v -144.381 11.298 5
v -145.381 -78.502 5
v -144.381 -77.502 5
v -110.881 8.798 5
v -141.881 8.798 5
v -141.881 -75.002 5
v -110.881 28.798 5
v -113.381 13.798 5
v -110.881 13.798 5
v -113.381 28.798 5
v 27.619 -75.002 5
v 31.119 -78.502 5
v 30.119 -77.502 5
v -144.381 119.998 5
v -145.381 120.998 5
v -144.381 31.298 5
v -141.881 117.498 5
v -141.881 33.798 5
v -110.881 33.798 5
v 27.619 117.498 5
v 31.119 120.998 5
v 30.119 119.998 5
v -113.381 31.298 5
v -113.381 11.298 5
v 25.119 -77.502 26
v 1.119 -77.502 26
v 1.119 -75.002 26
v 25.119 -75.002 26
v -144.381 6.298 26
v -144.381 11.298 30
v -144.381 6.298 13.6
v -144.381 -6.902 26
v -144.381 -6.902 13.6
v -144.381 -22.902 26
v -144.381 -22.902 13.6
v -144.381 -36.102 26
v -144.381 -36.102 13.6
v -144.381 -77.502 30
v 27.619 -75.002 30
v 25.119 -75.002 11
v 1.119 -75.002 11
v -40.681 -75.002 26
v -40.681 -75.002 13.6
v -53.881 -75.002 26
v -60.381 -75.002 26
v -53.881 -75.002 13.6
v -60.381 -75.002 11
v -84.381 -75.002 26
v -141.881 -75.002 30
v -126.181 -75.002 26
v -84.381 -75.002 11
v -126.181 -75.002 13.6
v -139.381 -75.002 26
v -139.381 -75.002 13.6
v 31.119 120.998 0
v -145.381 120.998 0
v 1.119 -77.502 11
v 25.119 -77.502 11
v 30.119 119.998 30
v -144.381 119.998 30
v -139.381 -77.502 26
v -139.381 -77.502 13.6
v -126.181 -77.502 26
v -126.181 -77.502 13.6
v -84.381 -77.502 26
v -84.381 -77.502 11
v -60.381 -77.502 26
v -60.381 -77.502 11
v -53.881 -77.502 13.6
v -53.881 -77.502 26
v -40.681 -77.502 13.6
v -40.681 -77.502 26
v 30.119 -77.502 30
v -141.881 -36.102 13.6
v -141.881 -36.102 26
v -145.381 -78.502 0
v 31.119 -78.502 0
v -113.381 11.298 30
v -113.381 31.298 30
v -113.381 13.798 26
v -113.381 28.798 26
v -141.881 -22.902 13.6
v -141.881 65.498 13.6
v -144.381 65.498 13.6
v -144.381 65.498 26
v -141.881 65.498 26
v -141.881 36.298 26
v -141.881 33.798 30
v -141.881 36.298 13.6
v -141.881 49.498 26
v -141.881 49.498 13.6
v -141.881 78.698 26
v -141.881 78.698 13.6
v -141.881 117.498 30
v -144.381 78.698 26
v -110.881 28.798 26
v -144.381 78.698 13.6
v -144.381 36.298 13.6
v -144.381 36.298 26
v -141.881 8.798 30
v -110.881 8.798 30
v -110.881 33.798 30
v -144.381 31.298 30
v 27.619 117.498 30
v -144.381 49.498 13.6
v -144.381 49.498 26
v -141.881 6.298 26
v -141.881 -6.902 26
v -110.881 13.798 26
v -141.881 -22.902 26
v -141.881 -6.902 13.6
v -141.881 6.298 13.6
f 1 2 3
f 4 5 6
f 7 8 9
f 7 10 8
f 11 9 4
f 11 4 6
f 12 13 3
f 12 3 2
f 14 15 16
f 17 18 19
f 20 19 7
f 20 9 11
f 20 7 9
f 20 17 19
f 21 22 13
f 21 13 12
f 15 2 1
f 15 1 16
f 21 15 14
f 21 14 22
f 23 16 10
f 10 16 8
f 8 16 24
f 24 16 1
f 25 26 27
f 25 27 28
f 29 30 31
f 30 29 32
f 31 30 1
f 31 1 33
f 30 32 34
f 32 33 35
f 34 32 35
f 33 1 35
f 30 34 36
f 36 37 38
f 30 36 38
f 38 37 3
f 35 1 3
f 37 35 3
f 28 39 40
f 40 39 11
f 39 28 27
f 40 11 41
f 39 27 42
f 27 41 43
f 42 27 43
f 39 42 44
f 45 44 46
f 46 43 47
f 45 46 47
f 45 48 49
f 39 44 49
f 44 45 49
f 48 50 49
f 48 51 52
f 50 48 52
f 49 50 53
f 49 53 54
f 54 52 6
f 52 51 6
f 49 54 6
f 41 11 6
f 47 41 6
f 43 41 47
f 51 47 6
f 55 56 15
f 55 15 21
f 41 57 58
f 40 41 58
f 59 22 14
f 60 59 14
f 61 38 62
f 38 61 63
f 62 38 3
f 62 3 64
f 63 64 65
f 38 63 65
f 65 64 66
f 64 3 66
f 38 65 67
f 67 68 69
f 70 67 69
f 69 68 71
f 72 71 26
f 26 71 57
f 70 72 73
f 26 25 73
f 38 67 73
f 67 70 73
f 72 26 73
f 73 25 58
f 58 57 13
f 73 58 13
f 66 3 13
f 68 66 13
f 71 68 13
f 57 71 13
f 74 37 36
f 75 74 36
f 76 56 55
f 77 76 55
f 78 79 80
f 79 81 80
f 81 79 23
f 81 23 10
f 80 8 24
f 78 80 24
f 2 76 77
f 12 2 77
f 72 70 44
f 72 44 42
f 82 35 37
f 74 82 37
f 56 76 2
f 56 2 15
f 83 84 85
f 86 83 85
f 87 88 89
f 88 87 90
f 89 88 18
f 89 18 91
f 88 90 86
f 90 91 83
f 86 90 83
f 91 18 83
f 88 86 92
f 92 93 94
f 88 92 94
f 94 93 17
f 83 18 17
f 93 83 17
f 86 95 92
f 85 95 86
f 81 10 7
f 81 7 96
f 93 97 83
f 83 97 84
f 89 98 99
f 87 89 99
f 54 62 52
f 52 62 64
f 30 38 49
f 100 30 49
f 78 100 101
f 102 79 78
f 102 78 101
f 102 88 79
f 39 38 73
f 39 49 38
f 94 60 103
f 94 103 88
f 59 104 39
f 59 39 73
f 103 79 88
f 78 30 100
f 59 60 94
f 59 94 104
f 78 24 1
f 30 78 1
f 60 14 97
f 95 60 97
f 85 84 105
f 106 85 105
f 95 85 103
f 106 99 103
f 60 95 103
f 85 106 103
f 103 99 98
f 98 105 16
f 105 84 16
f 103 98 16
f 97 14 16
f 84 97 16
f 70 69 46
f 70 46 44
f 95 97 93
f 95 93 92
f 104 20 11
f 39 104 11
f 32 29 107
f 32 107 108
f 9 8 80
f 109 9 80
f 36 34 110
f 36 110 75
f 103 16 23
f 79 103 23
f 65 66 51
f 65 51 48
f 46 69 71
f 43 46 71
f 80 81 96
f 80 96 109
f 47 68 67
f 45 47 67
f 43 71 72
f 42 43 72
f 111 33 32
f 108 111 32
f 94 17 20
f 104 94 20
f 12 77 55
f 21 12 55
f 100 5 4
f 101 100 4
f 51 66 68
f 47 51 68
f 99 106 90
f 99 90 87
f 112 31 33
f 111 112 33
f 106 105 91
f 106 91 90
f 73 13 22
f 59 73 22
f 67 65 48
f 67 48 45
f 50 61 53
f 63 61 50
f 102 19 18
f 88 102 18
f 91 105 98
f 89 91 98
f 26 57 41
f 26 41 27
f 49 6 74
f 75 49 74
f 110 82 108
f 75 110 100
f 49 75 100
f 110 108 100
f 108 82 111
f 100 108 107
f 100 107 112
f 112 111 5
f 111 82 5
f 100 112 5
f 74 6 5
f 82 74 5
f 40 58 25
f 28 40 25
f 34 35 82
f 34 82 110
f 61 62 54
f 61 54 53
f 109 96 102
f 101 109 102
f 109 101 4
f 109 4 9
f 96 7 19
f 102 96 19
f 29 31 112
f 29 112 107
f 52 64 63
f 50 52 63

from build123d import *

# Parameters (mm, degrees)
F0_W     = 176.5
F0_H     = 199.5
F1_DEPTH = 5
F2_W     = 2.5
F2_H     = 83.7
F2_H_2   = 83.8
F3_DEPTH = 25
F4_W     = 15
F4_H     = 21
F5_DEPTH = 2.5
F6_W     = 13.2
F6_H     = 12.4
F7_DEPTH = 2.5
F8_W     = 13.2
F8_H     = 12.4
F8_W_2   = 24
F8_H_2   = 15
F9_DEPTH = 2.5


# Not quite as in the source:
# - a feature names something its author has since deleted; it is built from what else it names


with BuildPart() as f1:
    # F0 (on Top) → F1 (new body)
    with BuildSketch(Plane.XY):
        with Locations((-57.1313334405, 21.2478748113)):
            Rectangle(F0_W, F0_H)
    extrude(amount=F1_DEPTH)

    # F2 (on face) → F3 (join)
    with BuildSketch(Plane.XY.offset(5)):
        Polygon((-141.8813334405, 33.7978748113), (-144.3813334405, 33.7978748113), (-144.3813334405, 31.2978748113), (-113.3813334405, 31.2978748113), (-113.3813334405, 11.2978748113), (-144.3813334405, 11.2978748113), (-144.3813334405, 8.7978748113), (-141.8813334405, 8.7978748113), (-110.8813334405, 8.7978748113), (-110.8813334405, 33.7978748113), align=None)
        with Locations((-143.1313334405, 75.6478748113)):
            Rectangle(F2_W, F2_H)
        Polygon((30.1186665595, 119.9978748113), (-144.3813334405, 119.9978748113), (-144.3813334405, 117.4978748113), (-141.8813334405, 117.4978748113), (27.6186665595, 117.4978748113), (27.6186665595, -75.0021251887), (-141.8813334405, -75.0021251887), (-144.3813334405, -75.0021251887), (-144.3813334405, -77.5021251887), (30.1186665595, -77.5021251887), align=None)
        with Locations((-143.1313334405, -33.1021251887)):
            Rectangle(F2_W, F2_H_2)
    extrude(amount=F3_DEPTH)

    # F4 (on face) → F5 (cut, through all)
    with BuildSketch(Plane(origin=(-113.3813334405, 0, 0), x_dir=(0, -1, 0), z_dir=(-1, 0, 0))):
        with Locations((-21.2978748113, 15.5)):
            Rectangle(F4_W, F4_H)
    extrude(amount=-F5_DEPTH, mode=Mode.SUBTRACT)

    # F6 (on face) → F7 (cut, through all)
    with BuildSketch(Plane(origin=(-144.3813334405, 0, 0), x_dir=(0, -1, 0), z_dir=(-1, 0, 0))):
        with Locations((-72.0978748113, 19.8)):
            Rectangle(F6_W, F6_H)
        with Locations((-42.8978748113, 19.8)):
            Rectangle(F6_W, F6_H)
        with Locations((0.3021251887, 19.8)):
            Rectangle(F6_W, F6_H)
        with Locations((29.5021251887, 19.8)):
            Rectangle(F6_W, F6_H)
    extrude(amount=-F7_DEPTH, mode=Mode.SUBTRACT)

    # F8 (on face) → F9 (cut, through all)
    with BuildSketch(Plane.XZ.offset(77.5021251887)):
        with Locations((-132.7813334405, 19.8)):
            Rectangle(F8_W, F8_H)
        with Locations((-72.3813334405, 18.5)):
            Rectangle(F8_W_2, F8_H_2)
        with Locations((-47.2813334405, 19.8)):
            Rectangle(F8_W, F8_H)
        with Locations((13.1186665595, 18.5)):
            Rectangle(F8_W_2, F8_H_2)
    extrude(amount=-F9_DEPTH, mode=Mode.SUBTRACT)


solid = f1.part
